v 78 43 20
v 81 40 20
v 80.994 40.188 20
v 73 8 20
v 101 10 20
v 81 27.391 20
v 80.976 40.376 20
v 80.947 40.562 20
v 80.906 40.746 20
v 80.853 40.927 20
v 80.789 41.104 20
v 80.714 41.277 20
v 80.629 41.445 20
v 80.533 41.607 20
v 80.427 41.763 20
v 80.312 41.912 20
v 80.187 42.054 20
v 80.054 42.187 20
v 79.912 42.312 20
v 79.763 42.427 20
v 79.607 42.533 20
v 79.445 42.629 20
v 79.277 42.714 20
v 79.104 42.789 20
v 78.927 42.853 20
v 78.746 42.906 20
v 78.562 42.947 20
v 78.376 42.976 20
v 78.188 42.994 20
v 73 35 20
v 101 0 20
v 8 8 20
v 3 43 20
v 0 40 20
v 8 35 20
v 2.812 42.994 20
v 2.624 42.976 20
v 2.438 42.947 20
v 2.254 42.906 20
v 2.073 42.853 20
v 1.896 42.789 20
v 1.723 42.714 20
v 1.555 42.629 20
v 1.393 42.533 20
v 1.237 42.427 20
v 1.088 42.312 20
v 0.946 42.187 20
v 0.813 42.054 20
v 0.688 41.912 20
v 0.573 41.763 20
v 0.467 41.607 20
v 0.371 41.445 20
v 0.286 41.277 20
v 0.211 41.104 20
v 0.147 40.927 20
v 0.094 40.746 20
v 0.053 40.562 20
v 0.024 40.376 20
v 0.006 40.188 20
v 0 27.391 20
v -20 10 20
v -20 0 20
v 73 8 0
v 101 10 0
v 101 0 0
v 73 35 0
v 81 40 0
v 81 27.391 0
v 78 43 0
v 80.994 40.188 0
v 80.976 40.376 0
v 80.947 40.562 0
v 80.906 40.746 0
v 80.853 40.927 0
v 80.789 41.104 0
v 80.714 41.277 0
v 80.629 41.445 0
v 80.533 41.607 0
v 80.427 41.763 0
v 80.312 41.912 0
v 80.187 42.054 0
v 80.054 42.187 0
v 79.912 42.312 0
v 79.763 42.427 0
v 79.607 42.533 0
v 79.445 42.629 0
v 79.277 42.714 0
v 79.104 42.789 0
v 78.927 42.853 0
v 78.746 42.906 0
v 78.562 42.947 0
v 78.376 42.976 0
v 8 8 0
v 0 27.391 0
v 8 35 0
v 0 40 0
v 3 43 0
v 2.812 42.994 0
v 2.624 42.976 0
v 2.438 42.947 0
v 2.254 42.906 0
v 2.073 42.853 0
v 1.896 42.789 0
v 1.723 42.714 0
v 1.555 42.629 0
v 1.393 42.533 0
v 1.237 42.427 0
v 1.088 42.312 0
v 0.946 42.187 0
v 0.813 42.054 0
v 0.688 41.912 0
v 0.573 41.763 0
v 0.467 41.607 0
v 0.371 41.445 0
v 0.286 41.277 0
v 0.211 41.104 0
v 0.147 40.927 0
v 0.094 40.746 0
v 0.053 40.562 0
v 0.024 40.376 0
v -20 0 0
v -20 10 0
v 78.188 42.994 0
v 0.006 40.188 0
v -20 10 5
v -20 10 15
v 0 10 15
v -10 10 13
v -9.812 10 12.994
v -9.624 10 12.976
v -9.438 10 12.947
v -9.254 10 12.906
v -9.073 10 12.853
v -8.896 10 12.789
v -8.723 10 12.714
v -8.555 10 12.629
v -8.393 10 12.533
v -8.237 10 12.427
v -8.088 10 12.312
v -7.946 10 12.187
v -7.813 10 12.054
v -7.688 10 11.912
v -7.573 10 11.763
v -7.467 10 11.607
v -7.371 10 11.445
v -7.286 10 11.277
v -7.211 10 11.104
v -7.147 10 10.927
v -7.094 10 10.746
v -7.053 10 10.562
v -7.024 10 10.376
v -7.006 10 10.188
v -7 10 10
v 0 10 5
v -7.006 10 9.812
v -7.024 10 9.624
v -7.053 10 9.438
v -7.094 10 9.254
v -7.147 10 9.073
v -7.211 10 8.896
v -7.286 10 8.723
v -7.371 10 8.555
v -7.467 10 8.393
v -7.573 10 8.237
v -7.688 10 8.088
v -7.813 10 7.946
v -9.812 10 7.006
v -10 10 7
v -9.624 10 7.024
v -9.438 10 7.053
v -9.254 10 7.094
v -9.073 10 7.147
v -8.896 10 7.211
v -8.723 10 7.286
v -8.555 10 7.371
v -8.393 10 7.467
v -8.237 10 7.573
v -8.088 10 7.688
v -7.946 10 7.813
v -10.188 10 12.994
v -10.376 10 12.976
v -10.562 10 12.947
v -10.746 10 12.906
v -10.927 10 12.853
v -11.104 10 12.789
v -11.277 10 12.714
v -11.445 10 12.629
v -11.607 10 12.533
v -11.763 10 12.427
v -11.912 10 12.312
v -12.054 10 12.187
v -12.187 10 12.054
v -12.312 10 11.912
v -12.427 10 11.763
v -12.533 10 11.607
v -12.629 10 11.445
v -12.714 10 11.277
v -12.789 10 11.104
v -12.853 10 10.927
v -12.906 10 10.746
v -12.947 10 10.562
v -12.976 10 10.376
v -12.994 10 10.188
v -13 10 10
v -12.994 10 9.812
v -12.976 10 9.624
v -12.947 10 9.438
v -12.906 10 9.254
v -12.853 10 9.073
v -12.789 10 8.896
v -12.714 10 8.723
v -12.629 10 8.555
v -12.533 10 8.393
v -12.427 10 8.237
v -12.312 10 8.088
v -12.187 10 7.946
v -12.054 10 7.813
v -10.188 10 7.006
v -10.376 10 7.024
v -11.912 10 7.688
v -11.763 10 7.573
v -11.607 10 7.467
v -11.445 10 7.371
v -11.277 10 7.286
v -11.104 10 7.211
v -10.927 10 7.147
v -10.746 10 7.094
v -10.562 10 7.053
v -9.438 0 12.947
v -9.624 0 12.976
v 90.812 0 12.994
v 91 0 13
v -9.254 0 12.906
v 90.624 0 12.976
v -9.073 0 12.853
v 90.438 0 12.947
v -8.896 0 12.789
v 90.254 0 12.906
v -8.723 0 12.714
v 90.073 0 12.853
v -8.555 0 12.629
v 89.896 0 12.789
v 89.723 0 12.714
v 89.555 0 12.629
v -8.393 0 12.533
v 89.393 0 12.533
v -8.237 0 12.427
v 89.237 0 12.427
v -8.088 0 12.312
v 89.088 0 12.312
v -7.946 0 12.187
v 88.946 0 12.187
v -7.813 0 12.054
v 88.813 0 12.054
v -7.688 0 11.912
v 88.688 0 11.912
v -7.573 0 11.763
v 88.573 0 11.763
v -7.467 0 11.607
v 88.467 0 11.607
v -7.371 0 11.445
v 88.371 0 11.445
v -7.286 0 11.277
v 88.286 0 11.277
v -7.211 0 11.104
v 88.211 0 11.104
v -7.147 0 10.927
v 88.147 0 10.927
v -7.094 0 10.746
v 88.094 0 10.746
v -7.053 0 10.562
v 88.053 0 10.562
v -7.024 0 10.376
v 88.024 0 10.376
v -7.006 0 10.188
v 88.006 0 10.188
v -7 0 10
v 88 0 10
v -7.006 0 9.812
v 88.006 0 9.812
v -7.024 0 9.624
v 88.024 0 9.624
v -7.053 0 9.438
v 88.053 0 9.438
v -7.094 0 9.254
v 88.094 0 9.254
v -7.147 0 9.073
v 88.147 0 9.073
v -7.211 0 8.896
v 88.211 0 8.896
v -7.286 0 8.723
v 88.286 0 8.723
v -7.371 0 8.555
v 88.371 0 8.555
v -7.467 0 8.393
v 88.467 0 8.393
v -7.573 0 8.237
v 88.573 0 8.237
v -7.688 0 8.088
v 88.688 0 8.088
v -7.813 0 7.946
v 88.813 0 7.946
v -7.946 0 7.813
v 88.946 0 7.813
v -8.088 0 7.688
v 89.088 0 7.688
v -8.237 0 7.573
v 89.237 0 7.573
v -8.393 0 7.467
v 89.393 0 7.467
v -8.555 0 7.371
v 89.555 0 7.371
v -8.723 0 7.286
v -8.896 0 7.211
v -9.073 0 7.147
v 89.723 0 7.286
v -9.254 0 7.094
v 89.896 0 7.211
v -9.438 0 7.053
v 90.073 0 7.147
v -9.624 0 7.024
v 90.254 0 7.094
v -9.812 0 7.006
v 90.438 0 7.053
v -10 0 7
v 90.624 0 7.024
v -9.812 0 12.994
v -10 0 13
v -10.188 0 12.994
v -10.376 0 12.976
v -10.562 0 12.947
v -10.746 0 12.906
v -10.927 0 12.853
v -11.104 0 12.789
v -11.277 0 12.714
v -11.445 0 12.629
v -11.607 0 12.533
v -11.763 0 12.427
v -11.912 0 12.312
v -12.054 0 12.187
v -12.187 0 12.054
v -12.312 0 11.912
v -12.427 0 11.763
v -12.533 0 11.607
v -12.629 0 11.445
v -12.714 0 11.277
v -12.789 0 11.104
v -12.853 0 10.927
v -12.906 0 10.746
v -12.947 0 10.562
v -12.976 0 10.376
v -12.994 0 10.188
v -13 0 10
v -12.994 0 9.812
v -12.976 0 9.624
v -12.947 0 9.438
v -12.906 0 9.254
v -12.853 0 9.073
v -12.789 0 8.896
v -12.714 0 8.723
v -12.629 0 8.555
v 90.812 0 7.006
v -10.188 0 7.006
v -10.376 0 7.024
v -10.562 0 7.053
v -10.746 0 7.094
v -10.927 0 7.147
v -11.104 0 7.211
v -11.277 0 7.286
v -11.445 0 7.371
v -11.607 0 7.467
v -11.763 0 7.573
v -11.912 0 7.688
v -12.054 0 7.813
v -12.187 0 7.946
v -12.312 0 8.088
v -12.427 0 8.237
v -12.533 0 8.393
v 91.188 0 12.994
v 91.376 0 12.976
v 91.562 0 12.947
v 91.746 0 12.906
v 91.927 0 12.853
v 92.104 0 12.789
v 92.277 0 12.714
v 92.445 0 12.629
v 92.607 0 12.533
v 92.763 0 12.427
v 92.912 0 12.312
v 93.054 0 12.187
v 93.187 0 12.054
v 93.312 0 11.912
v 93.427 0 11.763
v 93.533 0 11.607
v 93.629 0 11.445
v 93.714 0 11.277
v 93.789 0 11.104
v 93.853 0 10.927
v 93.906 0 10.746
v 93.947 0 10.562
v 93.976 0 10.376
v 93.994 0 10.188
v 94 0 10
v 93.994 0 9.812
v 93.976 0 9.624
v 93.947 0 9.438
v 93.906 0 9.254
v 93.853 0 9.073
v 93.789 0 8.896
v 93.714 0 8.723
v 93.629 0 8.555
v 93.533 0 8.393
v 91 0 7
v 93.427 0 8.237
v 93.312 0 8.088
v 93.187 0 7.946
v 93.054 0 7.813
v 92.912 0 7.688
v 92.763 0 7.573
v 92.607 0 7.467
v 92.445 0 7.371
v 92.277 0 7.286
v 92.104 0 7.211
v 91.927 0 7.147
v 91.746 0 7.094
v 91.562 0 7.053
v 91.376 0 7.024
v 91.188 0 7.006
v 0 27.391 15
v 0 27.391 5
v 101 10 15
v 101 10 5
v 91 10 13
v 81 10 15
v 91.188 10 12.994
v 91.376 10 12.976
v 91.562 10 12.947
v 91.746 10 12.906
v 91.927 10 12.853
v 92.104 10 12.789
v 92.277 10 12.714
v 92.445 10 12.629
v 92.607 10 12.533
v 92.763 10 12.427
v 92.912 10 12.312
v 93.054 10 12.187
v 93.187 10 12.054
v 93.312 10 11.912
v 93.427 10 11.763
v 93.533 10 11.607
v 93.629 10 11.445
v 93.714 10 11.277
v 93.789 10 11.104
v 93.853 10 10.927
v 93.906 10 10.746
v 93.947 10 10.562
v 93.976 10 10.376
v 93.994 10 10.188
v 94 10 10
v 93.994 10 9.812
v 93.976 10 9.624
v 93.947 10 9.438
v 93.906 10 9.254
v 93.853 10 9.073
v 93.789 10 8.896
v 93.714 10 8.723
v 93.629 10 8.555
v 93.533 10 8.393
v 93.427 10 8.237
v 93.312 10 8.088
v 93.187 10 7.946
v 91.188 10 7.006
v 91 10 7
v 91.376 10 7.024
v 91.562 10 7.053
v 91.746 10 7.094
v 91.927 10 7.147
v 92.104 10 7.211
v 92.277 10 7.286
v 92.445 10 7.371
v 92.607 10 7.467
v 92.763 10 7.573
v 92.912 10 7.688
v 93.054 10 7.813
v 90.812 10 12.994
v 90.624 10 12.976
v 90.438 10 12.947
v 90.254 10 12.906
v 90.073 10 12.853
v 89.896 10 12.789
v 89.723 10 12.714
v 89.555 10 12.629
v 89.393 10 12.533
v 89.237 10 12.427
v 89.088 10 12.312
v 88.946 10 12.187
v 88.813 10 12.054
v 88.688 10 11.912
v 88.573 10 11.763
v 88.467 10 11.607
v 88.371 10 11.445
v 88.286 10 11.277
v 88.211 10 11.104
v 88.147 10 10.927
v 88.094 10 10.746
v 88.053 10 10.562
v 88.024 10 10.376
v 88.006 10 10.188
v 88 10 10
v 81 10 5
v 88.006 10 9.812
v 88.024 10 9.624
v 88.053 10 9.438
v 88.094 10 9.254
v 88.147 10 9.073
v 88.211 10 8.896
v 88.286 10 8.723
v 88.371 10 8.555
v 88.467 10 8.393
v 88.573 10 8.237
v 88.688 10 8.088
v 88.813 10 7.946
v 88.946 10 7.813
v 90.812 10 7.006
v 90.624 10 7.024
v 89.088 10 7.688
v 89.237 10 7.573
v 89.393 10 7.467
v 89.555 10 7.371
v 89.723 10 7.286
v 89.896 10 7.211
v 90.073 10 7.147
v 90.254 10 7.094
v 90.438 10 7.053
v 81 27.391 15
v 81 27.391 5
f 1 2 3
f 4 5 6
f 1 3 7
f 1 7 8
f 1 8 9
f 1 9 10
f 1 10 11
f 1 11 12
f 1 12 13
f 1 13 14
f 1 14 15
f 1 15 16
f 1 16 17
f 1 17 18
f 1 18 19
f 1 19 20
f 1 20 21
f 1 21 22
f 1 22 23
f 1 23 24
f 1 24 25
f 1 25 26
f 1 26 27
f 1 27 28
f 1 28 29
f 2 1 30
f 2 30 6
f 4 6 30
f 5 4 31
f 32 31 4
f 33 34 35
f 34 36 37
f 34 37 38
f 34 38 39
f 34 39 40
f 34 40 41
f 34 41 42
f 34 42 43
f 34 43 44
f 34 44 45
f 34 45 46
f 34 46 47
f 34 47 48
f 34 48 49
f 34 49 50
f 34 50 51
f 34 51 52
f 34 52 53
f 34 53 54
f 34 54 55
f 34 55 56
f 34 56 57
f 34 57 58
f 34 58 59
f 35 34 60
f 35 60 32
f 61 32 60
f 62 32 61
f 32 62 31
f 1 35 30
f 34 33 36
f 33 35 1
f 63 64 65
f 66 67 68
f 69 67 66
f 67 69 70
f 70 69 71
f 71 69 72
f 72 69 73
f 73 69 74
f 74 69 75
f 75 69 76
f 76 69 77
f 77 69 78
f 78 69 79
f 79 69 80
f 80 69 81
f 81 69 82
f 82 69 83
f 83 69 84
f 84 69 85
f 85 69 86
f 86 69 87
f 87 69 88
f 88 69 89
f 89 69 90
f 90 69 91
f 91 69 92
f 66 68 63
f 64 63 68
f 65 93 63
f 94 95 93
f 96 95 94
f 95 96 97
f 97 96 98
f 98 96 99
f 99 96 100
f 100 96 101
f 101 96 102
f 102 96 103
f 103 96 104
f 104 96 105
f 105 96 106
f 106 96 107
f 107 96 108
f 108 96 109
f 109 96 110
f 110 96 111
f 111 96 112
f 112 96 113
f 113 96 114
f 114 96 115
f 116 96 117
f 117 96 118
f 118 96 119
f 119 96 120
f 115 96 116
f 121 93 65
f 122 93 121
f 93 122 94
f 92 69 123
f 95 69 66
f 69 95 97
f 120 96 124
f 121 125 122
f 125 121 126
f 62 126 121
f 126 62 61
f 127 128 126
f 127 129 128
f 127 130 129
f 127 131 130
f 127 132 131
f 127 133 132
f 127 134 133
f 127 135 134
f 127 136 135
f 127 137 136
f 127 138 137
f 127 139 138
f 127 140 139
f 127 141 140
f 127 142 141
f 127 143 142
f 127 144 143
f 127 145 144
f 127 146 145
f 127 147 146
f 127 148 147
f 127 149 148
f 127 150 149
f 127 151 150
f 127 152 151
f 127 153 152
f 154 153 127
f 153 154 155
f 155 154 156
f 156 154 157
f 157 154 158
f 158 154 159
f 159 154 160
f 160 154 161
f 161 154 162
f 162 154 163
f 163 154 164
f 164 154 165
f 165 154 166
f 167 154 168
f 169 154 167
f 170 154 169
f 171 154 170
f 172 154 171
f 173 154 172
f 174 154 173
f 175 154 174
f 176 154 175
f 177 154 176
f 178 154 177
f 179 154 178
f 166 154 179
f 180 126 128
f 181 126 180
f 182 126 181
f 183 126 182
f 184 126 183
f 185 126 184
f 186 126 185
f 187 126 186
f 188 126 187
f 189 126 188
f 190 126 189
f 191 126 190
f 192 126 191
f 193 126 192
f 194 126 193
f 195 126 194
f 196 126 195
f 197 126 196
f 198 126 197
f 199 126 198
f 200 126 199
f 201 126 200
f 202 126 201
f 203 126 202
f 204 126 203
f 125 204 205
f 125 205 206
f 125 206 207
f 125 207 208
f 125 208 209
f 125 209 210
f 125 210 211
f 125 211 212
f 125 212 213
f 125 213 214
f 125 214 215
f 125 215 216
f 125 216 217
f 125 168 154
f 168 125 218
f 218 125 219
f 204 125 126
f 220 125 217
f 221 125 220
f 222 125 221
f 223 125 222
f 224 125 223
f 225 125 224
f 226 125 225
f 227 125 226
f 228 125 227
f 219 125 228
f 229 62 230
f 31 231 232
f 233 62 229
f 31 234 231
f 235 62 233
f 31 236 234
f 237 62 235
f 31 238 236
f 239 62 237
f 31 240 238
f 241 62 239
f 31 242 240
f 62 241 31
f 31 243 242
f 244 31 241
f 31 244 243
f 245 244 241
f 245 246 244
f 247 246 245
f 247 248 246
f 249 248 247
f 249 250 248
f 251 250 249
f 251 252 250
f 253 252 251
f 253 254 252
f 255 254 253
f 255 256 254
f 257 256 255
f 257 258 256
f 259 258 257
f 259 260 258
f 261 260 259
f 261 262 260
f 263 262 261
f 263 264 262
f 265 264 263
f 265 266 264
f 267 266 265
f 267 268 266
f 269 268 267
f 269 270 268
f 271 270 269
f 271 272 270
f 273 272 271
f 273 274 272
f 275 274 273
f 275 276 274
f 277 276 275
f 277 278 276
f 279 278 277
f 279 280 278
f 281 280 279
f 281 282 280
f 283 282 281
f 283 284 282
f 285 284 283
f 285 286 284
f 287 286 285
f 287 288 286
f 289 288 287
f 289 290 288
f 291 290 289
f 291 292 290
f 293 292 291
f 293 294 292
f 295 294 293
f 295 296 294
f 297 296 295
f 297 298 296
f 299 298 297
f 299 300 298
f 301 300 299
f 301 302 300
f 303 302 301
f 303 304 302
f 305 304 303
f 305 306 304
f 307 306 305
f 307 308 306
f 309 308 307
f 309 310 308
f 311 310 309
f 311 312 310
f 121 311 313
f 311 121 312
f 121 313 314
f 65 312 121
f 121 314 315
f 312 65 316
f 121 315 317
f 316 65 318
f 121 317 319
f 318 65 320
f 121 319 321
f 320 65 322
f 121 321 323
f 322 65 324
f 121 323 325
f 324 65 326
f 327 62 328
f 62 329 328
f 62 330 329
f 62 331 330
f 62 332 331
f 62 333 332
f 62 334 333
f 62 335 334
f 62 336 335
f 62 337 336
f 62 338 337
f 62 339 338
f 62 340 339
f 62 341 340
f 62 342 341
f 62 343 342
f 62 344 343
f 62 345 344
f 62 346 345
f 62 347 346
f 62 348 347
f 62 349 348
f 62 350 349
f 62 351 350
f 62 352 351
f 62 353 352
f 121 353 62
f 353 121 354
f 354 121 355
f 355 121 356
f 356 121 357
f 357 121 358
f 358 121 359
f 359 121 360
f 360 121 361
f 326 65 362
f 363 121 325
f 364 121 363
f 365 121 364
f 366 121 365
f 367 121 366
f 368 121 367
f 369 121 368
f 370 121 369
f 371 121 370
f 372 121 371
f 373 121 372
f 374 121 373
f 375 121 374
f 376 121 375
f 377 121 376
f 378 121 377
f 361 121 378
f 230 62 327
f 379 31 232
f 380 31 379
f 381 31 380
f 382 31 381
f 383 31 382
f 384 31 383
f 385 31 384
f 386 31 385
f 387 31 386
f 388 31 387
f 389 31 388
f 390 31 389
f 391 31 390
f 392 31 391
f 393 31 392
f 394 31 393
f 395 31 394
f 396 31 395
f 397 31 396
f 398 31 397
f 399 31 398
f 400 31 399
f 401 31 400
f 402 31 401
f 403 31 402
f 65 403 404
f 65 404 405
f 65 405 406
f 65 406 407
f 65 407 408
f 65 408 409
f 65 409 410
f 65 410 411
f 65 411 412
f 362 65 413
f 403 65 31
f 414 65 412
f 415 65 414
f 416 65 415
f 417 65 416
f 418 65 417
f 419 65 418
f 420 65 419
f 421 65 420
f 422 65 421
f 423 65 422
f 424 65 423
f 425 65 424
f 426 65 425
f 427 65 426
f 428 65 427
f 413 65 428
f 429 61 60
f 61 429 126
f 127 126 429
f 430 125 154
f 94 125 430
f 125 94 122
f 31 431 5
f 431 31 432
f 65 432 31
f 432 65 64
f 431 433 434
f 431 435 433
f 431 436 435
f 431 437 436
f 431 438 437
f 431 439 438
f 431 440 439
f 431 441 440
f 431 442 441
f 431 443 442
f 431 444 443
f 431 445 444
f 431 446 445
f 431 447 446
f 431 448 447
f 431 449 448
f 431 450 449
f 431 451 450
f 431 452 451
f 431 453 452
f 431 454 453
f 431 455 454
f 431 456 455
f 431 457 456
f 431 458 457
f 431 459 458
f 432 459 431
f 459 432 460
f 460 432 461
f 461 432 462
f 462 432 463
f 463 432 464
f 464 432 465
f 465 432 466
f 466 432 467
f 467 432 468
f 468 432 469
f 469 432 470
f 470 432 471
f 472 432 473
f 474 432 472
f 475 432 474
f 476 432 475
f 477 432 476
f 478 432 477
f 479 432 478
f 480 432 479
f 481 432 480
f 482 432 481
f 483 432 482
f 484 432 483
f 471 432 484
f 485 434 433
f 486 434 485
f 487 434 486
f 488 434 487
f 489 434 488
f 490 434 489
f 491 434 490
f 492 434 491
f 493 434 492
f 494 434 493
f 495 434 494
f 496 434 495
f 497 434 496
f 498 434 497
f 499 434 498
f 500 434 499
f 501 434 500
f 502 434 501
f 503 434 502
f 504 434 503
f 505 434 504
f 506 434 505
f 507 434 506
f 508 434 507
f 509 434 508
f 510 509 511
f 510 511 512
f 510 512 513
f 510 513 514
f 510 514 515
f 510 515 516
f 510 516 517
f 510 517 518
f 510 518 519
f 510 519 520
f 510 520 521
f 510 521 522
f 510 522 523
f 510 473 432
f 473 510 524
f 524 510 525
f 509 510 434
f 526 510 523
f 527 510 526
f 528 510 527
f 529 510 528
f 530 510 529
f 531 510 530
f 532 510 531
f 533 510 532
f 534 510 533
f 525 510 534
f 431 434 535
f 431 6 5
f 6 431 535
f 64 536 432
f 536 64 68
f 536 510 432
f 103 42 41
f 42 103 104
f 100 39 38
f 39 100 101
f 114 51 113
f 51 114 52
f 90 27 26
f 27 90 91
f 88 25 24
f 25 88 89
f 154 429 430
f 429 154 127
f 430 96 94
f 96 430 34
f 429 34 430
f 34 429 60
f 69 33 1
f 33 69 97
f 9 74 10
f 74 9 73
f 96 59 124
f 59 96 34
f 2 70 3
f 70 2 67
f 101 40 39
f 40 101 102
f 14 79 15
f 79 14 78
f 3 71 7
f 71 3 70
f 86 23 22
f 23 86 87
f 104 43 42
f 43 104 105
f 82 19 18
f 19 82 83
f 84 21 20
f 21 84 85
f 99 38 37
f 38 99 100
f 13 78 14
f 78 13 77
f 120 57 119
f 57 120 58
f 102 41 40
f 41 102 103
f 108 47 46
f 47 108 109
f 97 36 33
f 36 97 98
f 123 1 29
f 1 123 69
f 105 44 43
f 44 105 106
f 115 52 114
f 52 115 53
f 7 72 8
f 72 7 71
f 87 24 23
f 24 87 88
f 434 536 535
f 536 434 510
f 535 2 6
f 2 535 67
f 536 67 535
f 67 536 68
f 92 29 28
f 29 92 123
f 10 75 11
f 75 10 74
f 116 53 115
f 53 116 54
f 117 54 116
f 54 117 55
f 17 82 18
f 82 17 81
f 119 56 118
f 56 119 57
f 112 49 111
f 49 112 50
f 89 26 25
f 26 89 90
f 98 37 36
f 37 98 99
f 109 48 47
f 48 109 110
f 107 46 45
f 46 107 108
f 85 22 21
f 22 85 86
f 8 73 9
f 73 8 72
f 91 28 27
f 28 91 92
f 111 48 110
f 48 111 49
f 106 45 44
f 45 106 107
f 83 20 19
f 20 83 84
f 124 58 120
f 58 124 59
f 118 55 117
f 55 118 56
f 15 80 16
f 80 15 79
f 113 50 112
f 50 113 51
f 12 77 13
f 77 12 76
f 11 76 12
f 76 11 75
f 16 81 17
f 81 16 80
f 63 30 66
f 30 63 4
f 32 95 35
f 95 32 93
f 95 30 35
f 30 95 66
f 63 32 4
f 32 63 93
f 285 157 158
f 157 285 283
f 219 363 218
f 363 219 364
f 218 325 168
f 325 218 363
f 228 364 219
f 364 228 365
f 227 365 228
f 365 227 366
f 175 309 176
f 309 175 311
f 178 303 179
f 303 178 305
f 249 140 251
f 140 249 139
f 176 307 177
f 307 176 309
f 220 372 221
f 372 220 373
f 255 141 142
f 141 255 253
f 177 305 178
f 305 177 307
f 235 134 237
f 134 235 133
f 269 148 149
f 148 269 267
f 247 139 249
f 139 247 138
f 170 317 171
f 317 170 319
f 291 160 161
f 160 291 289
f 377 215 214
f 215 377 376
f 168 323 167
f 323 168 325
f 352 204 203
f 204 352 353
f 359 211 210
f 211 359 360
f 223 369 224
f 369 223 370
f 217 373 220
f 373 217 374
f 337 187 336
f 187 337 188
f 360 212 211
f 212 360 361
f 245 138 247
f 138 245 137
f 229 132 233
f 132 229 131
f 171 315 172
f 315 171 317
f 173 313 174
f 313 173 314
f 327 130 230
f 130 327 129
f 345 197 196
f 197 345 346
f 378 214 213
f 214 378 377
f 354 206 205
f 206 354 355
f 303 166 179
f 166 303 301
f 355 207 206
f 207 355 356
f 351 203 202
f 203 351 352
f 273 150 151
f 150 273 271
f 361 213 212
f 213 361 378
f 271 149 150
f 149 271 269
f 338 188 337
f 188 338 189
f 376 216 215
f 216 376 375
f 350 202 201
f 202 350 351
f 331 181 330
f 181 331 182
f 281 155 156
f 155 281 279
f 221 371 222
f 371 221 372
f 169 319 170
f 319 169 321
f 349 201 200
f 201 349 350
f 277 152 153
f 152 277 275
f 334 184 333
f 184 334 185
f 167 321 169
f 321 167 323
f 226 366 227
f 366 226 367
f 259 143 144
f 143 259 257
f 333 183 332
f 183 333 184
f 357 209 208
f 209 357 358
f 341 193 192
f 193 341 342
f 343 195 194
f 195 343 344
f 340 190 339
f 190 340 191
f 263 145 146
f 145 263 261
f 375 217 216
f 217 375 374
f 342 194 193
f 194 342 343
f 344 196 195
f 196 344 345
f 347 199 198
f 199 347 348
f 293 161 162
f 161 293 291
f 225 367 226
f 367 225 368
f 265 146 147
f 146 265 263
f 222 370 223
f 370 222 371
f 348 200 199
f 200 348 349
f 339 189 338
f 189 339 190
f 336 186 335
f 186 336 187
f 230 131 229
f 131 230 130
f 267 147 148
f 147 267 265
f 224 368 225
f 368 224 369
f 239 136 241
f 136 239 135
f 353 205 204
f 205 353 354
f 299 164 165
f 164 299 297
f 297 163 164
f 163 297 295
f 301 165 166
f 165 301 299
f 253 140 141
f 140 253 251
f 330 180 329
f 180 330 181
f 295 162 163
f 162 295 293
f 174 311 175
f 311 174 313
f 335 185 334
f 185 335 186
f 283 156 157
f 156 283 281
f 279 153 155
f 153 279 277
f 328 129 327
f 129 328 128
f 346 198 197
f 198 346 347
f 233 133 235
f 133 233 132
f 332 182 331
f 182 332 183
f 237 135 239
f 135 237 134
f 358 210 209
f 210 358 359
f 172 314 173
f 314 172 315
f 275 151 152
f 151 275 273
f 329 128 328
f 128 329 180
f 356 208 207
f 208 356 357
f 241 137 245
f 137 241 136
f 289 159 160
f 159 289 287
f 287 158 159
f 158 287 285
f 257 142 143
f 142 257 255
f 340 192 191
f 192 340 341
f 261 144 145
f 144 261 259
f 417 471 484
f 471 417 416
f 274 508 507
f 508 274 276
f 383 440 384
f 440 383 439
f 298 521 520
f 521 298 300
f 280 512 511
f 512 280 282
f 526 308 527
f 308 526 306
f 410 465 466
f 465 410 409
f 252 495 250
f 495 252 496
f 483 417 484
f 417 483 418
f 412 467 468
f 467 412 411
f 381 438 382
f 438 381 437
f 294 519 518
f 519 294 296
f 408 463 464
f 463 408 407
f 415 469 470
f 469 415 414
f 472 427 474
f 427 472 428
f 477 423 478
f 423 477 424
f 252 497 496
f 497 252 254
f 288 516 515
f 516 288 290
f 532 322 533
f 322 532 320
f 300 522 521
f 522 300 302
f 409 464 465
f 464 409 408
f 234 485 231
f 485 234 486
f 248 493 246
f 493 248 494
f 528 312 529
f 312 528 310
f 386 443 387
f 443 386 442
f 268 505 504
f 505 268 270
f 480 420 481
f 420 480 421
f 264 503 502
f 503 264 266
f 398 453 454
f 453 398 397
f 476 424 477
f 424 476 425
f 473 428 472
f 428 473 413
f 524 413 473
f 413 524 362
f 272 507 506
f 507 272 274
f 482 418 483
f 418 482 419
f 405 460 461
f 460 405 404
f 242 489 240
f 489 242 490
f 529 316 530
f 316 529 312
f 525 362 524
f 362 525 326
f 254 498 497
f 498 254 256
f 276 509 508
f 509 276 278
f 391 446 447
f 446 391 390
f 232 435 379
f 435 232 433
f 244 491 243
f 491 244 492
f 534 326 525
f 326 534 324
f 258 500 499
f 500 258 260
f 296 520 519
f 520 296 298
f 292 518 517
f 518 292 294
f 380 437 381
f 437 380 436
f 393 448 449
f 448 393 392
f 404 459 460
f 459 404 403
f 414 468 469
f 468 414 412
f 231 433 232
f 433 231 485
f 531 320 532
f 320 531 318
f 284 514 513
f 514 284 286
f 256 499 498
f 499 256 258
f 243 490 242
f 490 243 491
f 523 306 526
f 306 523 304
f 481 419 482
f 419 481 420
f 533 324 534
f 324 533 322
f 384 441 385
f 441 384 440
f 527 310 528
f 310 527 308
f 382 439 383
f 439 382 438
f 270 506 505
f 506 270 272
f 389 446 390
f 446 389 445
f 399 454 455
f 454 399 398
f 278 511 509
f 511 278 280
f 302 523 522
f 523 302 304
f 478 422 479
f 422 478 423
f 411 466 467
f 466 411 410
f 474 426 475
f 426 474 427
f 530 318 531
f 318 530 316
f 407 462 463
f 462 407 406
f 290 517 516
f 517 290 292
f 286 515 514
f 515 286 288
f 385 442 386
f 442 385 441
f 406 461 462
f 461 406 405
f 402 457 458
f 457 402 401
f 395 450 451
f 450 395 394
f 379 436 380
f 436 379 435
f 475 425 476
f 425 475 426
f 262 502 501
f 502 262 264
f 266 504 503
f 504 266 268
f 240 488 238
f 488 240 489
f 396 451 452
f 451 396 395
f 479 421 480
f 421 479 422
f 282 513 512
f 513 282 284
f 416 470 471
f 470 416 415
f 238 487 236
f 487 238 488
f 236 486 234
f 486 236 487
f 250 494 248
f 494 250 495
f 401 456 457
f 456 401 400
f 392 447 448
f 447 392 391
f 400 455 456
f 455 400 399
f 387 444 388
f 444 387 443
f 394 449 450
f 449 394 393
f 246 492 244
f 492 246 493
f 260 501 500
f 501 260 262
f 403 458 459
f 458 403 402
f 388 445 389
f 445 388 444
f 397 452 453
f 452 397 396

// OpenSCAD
$fn=100;

plug_width = 65;
plug_height = 27;
mount_depth = 20;

thickness = 8;
fillet_radius = 3;
support_thickness = 5;

// outside width of the central box
box_od_width = plug_width + (2*thickness);
// outside height of the central box
box_od_height = plug_height + (2*thickness);


difference() {
    union() {
        roundedCube(
            box_od_width,
            box_od_height,
            mount_depth);
        translate([-mount_depth, 0, 0]) {
            cube([mount_depth+fillet_radius, 10, mount_depth]);
            
            translate([0, 10, mount_depth - support_thickness]) {
                rotate([-90, -90, 0]) {
                    prism(support_thickness, mount_depth+fillet_radius, mount_depth);
                }
            }
            translate([0, 10, 0]) {
                rotate([-90, -90, 0]) {
                    prism(support_thickness, mount_depth+fillet_radius, mount_depth);
                }
            }
        }
        translate([box_od_width - fillet_radius, 0, 0]) {
            cube([mount_depth+fillet_radius, 10, mount_depth]);
            
            translate([mount_depth+fillet_radius, 10, mount_depth]) {
                rotate([-90, 90, 0]) {
                    prism(support_thickness, mount_depth+fillet_radius, mount_depth);
                }
            }
            translate([mount_depth+fillet_radius, 10, support_thickness]) {
                rotate([-90, 90, 0]) {
                    prism(support_thickness, mount_depth+fillet_radius, mount_depth);
                }
            }
        }
    }
    
    
    translate([thickness, thickness, 0]){
        cube([plug_width, plug_height, mount_depth]);
    }
    
    translate([-mount_depth/2, 0, mount_depth/2]) {
        rotate([-90, 90, 0]) {
            cylinder(h=20,r=3);
        }
    }
    
    translate([box_od_width + (mount_depth/2), 0, mount_depth/2]) {
        rotate([-90, 90, 0]) {
            cylinder(h=20,r=3);
        }
    }
}


module roundedCube(x,y,z)
{
    translate([fillet_radius, fillet_radius, 0])
    minkowski() {
        cube([x-(2*fillet_radius), y-(2*fillet_radius), z-fillet_radius]);
        cylinder(fillet_radius, fillet_radius, fillet_radius);
    }
}

module prism(l, w, h){
      polyhedron(//pt 0        1        2        3        4        5
              points=[[0,0,0], [l,0,0], [l,w,0], [0,w,0], [0,w,h], [l, w,h]],
              faces=[[0,1,2,3],[5,4,3,2],[0,4,5,1],[0,3,4],[5,2,1]]
      );

 }
  
  
